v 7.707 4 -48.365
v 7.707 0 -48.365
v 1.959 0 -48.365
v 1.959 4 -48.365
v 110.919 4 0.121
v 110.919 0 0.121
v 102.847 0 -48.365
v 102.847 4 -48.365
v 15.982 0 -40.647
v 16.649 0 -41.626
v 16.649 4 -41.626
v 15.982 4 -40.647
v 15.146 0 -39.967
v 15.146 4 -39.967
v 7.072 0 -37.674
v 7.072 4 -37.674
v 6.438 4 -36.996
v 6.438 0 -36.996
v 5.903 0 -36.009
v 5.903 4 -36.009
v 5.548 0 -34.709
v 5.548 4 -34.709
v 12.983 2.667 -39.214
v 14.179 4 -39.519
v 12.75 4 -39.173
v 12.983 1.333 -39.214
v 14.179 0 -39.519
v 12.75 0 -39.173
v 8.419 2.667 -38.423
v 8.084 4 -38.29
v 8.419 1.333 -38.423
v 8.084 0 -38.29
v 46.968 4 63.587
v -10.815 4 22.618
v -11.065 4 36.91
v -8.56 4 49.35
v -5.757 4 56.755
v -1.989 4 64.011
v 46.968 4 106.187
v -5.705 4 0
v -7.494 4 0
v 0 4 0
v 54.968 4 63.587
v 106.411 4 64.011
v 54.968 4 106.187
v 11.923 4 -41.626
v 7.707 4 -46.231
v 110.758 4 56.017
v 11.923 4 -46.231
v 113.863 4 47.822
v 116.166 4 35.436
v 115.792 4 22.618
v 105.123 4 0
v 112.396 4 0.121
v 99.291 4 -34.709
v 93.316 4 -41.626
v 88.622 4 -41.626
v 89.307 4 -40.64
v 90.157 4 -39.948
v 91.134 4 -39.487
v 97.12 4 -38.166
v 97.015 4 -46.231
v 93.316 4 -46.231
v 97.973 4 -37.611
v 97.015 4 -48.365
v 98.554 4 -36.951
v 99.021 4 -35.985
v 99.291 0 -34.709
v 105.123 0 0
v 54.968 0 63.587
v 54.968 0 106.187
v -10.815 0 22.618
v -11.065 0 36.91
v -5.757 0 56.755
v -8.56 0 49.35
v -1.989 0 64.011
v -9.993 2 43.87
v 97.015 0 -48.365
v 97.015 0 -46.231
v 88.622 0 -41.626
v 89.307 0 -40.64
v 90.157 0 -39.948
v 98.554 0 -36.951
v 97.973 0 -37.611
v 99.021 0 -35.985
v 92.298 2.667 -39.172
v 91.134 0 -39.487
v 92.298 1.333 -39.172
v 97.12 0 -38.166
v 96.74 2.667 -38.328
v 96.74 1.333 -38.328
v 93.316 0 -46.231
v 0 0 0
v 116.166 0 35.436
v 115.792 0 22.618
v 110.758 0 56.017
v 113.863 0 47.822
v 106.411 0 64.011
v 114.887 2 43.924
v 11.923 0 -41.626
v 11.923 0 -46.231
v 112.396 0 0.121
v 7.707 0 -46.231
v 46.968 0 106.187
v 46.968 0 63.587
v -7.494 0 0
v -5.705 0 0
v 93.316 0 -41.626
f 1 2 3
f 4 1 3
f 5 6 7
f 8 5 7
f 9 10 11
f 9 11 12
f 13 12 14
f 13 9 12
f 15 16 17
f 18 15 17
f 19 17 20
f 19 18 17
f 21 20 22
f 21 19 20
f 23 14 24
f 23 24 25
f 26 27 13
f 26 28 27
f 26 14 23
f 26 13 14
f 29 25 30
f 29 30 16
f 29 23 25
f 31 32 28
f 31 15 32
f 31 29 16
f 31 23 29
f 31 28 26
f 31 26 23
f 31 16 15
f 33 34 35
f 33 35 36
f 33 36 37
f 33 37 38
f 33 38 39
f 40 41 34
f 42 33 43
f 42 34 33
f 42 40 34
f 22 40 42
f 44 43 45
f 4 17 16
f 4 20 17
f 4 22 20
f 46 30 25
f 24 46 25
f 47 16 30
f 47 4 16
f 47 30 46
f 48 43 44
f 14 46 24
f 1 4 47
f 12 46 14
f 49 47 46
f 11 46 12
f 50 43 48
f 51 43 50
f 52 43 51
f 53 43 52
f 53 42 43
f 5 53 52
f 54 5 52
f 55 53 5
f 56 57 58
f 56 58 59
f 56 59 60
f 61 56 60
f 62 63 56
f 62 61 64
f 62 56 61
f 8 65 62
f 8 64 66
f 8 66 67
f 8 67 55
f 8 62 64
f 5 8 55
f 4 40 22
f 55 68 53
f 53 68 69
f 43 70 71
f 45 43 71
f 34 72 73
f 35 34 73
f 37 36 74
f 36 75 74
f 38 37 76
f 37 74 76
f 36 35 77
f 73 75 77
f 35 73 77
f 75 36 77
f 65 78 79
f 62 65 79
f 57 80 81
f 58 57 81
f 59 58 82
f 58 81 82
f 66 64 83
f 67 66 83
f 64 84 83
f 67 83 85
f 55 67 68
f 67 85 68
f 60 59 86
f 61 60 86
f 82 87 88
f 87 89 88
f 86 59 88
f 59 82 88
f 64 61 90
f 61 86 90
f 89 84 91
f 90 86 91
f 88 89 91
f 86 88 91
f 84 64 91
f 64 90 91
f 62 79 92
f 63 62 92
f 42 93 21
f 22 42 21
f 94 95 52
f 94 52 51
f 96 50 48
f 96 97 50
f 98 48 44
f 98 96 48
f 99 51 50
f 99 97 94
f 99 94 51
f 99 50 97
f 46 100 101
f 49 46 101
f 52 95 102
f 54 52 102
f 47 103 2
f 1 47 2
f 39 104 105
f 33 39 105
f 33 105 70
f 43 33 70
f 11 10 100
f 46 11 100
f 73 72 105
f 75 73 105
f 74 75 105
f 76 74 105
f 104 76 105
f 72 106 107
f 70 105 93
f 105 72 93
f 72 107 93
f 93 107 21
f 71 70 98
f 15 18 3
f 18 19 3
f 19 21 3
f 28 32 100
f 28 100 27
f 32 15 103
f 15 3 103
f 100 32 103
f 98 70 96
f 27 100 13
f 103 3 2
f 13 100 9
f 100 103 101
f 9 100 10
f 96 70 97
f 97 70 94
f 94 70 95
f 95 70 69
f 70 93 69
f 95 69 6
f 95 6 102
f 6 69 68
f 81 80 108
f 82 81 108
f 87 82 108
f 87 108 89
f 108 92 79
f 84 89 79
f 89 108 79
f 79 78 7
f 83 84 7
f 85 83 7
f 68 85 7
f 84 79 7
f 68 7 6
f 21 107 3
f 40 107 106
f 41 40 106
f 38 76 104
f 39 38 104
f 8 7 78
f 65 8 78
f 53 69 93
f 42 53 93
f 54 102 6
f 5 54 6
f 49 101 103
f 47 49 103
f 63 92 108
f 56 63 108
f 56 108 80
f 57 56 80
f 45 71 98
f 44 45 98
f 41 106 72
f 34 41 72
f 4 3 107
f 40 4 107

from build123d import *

# Parameters (mm, degrees)
EXTRUDE_2_DEPTH = 4


with BuildPart() as part:
    # 草图1 → 凸台-拉伸2 (new body)
    with BuildSketch(Plane(origin=(0, 0, 0), x_dir=(1, 0, 0), z_dir=(0, 1, 0))):
        with BuildLine():
            Line((-7.493646731, 0), (-10.814865867, -22.617855932))
            add(Edge.make_bspline(
                [(-10.814865867, -22.617855932), (-13.583142705, -44.426344102), (-1.98899974, -64.01075601)],
                knots=[0, 0, 0, 1, 1, 1], degree=2))
            Line((-1.98899974, -64.01075601), (46.968083593, -106.186589343))
            Line((46.968083593, -106.186589343), (46.968083593, -63.586589343))
            Line((46.968083593, -63.586589343), (54.968083593, -63.586589343))
            Line((54.968083593, -63.586589343), (54.968083593, -106.186589343))
            Line((54.968083593, -106.186589343), (106.410598372, -64.01075601))
            add(Edge.make_bspline(
                [(115.792042318, -22.617855932), (118.672533556, -44.533714829), (106.410598372, -64.01075601)],
                knots=[0, 0, 0, 1, 1, 1], degree=2))
            Line((115.792042318, -22.617855932), (112.396356875, -0.121439872))
            Line((112.396356875, -0.121439872), (110.919371618, -0.121439872))
            Line((110.919371618, -0.121439872), (102.847231691, 48.365226521))
            Line((102.847231691, 48.365226521), (97.014954375, 48.365226521))
            Line((97.014954375, 48.365226521), (97.014954375, 46.231466528))
            Line((97.014954375, 46.231466528), (93.316437053, 46.231466528))
            Line((93.316437053, 46.231466528), (93.316437053, 41.625642308))
            Line((93.316437053, 41.625642308), (88.622165067, 41.625642308))
            add(Edge.make_bspline(
                [(88.622165067, 41.625642308), (91.029256543, 36.904254059), (98.571856956, 41.17808537), (99.290965035, 34.709162562)],
                knots=[0, 0, 0, 0, 1, 1, 1, 1], degree=3))
            Line((99.290965035, 34.709162562), (105.12324235, 0))
            Line((105.12324235, 0), (0, 0))
            Line((0, 0), (5.547775983, 34.709162562))
            add(Edge.make_bspline(
                [(16.649061602, 41.625642308), (14.296406024, 36.889271563), (6.70760812, 41.39847379), (5.547775983, 34.709162562)],
                knots=[0, 0, 0, 0, 1, 1, 1, 1], degree=3))
            Line((16.649061602, 41.625642308), (11.922711294, 41.625642308))
            Line((11.922711294, 41.625642308), (11.922711294, 46.231466528))
            Line((11.922711294, 46.231466528), (7.707317775, 46.231466528))
            Line((7.707317775, 46.231466528), (7.707317775, 48.365226521))
            Line((7.707317775, 48.365226521), (1.959053886, 48.365226521))
            Line((1.959053886, 48.365226521), (-5.705297966, 0))
            Line((-5.705297966, 0), (-7.493646731, 0))
        make_face()
    extrude(amount=EXTRUDE_2_DEPTH)


solid = part.part
